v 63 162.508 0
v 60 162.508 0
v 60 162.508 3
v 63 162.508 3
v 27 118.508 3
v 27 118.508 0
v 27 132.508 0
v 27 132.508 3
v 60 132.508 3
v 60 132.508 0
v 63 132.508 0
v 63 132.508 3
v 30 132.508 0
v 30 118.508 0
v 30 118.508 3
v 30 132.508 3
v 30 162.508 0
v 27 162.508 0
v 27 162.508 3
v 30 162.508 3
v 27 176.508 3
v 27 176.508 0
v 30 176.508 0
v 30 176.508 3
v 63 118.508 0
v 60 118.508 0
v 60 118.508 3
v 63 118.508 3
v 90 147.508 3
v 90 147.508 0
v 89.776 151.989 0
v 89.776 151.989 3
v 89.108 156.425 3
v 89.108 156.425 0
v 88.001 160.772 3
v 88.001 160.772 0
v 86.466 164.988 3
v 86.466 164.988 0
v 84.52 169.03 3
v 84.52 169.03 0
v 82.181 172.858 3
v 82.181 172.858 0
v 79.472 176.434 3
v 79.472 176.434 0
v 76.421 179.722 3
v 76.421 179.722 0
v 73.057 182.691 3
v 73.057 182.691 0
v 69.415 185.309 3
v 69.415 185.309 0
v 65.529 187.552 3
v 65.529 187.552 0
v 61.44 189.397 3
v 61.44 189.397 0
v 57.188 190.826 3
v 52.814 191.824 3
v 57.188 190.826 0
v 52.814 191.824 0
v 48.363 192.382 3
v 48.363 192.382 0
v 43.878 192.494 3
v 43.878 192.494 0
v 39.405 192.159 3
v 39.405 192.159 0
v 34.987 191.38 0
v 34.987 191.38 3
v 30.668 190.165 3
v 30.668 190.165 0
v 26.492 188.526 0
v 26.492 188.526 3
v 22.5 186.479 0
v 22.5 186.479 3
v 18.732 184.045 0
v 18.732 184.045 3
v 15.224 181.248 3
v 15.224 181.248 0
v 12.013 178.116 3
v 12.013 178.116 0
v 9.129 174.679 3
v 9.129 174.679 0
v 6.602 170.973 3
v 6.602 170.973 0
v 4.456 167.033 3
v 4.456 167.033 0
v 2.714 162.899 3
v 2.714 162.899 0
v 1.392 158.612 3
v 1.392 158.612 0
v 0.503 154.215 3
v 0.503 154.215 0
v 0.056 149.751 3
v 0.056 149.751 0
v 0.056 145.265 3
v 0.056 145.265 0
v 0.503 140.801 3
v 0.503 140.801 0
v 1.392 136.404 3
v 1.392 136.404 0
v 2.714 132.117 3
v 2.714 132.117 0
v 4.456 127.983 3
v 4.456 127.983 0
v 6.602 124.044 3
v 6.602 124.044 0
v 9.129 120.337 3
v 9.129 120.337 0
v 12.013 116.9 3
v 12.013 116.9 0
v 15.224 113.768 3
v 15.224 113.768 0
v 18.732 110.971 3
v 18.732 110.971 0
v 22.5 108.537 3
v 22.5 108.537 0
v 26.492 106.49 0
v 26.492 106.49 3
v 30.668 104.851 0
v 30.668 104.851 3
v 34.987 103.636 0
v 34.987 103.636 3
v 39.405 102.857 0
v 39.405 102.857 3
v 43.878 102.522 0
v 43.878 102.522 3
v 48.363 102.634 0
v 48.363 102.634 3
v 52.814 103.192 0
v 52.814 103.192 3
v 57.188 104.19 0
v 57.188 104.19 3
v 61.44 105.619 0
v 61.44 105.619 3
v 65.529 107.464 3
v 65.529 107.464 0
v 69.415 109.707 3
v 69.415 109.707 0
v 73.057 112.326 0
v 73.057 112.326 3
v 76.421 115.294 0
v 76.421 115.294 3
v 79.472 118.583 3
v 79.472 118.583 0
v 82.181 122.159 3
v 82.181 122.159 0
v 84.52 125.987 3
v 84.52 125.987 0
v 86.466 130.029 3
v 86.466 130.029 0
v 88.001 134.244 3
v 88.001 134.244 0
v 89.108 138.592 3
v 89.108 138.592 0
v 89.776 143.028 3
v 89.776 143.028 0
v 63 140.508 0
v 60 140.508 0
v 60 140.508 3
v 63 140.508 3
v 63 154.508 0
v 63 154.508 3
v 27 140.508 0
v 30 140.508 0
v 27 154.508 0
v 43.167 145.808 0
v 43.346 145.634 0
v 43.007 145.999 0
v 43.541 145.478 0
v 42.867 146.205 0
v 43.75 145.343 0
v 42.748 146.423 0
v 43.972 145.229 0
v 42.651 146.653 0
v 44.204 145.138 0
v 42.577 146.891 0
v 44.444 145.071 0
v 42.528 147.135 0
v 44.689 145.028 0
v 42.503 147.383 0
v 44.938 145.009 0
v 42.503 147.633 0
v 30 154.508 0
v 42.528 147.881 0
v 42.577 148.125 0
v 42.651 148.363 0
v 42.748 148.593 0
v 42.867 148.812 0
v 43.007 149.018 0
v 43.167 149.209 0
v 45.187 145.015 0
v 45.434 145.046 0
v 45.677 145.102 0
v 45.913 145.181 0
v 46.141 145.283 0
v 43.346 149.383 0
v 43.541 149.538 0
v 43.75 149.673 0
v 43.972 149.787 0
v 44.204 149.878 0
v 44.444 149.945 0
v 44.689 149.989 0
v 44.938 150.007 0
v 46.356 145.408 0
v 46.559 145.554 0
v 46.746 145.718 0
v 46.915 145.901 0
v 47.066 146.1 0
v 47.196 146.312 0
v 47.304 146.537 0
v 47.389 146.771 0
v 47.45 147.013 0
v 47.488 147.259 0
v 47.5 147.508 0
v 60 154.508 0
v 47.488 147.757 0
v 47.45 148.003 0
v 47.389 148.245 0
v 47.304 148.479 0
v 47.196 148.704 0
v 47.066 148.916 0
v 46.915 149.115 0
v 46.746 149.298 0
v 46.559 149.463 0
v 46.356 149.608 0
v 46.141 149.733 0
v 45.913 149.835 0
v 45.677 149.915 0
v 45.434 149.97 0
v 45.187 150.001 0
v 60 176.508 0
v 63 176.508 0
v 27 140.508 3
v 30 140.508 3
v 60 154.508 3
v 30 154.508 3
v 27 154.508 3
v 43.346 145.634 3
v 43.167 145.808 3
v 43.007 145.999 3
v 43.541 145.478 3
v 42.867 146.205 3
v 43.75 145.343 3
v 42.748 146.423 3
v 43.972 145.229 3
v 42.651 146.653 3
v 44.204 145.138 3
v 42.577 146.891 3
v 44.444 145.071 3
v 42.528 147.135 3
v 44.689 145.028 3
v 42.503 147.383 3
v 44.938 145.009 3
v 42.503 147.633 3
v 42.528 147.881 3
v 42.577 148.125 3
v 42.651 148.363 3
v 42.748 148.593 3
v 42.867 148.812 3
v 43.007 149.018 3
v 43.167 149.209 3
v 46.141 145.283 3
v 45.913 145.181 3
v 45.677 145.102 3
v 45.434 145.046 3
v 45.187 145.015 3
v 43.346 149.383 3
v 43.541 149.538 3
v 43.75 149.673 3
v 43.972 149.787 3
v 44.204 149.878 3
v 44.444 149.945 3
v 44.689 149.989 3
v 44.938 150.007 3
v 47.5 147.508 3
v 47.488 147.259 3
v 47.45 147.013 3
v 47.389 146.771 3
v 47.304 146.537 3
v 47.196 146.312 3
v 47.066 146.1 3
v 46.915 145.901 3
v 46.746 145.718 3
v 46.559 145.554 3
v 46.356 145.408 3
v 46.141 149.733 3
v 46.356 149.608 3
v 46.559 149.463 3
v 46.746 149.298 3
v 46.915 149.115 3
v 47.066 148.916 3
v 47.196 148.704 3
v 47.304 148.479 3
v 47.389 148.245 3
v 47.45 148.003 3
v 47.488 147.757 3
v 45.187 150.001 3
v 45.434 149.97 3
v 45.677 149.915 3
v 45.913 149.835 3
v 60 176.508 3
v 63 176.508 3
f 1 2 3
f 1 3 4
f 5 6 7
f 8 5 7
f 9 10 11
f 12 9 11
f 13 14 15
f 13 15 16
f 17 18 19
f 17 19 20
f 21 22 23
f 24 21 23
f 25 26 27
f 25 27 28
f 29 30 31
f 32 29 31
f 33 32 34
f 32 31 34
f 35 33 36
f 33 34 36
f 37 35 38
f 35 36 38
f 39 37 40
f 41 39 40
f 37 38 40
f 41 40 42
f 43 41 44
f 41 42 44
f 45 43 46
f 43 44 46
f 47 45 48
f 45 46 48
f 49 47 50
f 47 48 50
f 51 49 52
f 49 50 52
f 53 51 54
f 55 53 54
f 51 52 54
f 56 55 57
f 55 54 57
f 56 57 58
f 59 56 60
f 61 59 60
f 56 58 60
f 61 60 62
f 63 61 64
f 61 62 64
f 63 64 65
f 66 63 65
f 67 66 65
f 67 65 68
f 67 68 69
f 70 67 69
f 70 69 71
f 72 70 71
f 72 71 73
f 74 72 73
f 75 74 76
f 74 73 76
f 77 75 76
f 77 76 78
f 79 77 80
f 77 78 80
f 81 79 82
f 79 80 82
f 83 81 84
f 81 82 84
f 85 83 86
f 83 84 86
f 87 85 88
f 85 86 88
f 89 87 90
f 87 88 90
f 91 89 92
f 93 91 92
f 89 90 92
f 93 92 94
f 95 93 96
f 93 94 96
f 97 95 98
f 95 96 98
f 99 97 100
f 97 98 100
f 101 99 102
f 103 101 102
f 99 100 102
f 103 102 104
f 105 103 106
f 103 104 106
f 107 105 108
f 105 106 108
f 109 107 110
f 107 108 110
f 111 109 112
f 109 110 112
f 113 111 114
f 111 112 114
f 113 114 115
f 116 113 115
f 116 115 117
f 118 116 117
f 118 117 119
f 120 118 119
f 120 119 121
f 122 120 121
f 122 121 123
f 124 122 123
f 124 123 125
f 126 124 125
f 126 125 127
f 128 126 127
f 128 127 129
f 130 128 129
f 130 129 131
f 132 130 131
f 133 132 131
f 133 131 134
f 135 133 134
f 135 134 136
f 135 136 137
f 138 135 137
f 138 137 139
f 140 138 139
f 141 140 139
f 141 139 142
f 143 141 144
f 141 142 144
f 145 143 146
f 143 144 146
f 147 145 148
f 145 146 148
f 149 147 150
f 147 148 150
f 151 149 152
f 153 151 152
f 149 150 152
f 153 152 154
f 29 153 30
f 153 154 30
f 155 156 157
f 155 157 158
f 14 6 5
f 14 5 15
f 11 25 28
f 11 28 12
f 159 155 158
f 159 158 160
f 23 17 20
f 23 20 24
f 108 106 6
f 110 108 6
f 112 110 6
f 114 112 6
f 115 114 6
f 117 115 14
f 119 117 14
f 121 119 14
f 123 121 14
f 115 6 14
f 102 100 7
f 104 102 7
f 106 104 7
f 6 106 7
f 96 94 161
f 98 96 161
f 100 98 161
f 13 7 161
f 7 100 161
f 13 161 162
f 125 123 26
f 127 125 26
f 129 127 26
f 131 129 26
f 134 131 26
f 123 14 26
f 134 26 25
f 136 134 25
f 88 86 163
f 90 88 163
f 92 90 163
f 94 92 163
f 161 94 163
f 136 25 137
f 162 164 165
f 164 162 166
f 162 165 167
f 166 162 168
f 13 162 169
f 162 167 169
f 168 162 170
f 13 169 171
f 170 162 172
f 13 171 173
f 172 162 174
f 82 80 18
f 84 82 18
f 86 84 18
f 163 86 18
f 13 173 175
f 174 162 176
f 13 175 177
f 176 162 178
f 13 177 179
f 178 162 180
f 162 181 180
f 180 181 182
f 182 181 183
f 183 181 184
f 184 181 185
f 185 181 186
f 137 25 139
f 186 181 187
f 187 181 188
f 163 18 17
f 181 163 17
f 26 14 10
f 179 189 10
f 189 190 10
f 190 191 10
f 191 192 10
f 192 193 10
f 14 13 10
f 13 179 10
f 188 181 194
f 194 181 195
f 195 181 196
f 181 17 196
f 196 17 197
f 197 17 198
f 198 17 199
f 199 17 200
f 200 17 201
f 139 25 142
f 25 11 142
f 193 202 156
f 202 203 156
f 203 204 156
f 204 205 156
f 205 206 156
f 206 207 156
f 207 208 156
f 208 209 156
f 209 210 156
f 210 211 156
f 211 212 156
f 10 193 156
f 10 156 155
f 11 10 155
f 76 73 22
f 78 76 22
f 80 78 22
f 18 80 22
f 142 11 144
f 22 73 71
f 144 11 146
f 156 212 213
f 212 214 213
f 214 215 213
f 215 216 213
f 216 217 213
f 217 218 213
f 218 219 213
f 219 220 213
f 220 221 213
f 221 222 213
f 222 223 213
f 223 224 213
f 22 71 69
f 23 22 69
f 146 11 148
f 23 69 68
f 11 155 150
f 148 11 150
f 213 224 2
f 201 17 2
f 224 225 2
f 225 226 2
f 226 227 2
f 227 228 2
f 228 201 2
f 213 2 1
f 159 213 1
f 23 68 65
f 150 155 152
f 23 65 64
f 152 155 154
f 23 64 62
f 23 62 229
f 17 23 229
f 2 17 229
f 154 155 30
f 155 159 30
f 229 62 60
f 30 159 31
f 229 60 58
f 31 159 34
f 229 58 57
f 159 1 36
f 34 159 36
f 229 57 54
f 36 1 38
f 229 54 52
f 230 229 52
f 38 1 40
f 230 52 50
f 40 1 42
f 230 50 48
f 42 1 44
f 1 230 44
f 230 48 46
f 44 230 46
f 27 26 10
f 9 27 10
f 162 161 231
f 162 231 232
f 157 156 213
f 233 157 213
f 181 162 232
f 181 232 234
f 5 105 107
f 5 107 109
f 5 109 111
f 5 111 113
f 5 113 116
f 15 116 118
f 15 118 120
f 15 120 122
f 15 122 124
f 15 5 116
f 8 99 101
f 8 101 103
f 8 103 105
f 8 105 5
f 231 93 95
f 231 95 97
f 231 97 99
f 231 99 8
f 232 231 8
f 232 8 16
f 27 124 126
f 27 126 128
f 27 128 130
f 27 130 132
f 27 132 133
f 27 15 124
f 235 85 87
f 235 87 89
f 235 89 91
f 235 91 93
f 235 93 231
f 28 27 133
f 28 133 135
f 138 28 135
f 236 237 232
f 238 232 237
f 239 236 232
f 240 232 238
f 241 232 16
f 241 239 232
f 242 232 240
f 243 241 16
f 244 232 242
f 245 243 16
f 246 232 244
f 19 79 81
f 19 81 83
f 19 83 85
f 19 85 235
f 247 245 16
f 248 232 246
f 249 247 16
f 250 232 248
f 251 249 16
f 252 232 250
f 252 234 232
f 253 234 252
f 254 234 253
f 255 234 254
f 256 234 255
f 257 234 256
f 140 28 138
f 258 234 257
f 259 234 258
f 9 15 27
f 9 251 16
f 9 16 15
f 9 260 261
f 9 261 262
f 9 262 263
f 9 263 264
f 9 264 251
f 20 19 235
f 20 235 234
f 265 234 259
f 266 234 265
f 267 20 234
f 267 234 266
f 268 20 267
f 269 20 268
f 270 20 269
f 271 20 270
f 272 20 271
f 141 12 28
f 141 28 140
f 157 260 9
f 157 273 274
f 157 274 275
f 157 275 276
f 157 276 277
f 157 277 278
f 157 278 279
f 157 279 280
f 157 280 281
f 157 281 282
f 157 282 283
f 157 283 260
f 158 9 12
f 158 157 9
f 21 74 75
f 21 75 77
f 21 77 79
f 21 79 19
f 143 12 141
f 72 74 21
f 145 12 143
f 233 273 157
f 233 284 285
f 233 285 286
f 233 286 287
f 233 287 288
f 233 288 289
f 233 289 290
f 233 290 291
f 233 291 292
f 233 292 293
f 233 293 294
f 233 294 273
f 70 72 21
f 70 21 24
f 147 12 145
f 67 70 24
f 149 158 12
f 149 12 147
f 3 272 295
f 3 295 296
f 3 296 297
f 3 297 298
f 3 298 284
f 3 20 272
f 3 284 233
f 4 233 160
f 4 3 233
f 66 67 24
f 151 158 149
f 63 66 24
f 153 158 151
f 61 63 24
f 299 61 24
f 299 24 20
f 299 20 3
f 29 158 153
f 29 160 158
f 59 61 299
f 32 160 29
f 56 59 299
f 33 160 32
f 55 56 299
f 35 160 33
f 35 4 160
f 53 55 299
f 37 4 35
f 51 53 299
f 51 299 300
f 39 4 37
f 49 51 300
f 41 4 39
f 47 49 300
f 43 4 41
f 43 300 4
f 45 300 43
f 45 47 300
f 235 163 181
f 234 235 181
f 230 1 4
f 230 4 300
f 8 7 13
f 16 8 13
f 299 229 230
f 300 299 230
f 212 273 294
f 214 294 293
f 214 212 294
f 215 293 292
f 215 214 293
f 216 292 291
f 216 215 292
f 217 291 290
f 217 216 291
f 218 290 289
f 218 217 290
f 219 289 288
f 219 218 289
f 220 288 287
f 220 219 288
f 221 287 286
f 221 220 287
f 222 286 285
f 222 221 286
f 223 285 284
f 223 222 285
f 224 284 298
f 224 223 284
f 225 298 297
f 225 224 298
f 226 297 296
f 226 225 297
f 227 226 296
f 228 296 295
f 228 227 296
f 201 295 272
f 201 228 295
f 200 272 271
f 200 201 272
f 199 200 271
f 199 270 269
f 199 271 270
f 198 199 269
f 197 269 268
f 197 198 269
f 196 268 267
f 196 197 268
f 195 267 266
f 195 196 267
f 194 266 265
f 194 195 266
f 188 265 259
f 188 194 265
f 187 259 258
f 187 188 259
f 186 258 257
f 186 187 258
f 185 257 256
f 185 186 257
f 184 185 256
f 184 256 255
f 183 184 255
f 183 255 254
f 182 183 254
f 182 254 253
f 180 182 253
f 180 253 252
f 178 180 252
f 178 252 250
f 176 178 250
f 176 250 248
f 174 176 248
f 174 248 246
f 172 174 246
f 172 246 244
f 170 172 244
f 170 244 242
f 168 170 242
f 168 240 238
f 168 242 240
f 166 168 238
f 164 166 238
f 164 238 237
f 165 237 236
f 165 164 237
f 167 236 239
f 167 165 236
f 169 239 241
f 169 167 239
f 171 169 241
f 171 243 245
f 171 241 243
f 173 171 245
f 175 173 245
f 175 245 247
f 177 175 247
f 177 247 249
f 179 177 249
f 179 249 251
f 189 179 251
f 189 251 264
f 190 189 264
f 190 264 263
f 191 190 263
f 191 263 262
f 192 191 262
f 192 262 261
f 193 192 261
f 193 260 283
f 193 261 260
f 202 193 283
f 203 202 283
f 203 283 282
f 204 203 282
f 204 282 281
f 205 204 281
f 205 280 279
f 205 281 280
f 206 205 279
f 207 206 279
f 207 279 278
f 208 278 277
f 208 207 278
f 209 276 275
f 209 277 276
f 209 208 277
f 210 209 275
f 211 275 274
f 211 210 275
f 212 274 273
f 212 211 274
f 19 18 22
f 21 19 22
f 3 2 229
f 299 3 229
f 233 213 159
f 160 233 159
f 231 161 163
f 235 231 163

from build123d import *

# Parameters (mm, degrees)
SKETCH1_R           = 45
BOSS_EXTRUDE1_DEPTH = 3
SKETCH2_R           = 2.5
SKETCH2_W           = 3
SKETCH2_H           = 14
CUT_EXTRUDE3_DEPTH  = 35


with BuildPart() as part:
    # Sketch1 → Boss-Extrude1 (new body)
    with BuildSketch(Plane.XY):
        with Locations((45, 147.5080997)):
            Circle(SKETCH1_R)
    extrude(amount=BOSS_EXTRUDE1_DEPTH)

    # Sketch2 → Cut-Extrude3 (cut)
    with BuildSketch(Plane.XY):
        with Locations((45, 147.5080997)):
            Circle(SKETCH2_R)
        with Locations((61.5, 169.5080997)):
            Rectangle(SKETCH2_W, SKETCH2_H)
        with Locations((61.5, 147.5080997)):
            Rectangle(SKETCH2_W, SKETCH2_H)
        with Locations((61.5, 125.5080997)):
            Rectangle(SKETCH2_W, SKETCH2_H)
        with Locations((28.5, 169.5080997)):
            Rectangle(SKETCH2_W, SKETCH2_H)
        with Locations((28.5, 125.5080997)):
            Rectangle(SKETCH2_W, SKETCH2_H)
        with Locations((28.5, 147.5080997)):
            Rectangle(SKETCH2_W, SKETCH2_H)
    extrude(amount=CUT_EXTRUDE3_DEPTH, mode=Mode.SUBTRACT)


solid = part.part
